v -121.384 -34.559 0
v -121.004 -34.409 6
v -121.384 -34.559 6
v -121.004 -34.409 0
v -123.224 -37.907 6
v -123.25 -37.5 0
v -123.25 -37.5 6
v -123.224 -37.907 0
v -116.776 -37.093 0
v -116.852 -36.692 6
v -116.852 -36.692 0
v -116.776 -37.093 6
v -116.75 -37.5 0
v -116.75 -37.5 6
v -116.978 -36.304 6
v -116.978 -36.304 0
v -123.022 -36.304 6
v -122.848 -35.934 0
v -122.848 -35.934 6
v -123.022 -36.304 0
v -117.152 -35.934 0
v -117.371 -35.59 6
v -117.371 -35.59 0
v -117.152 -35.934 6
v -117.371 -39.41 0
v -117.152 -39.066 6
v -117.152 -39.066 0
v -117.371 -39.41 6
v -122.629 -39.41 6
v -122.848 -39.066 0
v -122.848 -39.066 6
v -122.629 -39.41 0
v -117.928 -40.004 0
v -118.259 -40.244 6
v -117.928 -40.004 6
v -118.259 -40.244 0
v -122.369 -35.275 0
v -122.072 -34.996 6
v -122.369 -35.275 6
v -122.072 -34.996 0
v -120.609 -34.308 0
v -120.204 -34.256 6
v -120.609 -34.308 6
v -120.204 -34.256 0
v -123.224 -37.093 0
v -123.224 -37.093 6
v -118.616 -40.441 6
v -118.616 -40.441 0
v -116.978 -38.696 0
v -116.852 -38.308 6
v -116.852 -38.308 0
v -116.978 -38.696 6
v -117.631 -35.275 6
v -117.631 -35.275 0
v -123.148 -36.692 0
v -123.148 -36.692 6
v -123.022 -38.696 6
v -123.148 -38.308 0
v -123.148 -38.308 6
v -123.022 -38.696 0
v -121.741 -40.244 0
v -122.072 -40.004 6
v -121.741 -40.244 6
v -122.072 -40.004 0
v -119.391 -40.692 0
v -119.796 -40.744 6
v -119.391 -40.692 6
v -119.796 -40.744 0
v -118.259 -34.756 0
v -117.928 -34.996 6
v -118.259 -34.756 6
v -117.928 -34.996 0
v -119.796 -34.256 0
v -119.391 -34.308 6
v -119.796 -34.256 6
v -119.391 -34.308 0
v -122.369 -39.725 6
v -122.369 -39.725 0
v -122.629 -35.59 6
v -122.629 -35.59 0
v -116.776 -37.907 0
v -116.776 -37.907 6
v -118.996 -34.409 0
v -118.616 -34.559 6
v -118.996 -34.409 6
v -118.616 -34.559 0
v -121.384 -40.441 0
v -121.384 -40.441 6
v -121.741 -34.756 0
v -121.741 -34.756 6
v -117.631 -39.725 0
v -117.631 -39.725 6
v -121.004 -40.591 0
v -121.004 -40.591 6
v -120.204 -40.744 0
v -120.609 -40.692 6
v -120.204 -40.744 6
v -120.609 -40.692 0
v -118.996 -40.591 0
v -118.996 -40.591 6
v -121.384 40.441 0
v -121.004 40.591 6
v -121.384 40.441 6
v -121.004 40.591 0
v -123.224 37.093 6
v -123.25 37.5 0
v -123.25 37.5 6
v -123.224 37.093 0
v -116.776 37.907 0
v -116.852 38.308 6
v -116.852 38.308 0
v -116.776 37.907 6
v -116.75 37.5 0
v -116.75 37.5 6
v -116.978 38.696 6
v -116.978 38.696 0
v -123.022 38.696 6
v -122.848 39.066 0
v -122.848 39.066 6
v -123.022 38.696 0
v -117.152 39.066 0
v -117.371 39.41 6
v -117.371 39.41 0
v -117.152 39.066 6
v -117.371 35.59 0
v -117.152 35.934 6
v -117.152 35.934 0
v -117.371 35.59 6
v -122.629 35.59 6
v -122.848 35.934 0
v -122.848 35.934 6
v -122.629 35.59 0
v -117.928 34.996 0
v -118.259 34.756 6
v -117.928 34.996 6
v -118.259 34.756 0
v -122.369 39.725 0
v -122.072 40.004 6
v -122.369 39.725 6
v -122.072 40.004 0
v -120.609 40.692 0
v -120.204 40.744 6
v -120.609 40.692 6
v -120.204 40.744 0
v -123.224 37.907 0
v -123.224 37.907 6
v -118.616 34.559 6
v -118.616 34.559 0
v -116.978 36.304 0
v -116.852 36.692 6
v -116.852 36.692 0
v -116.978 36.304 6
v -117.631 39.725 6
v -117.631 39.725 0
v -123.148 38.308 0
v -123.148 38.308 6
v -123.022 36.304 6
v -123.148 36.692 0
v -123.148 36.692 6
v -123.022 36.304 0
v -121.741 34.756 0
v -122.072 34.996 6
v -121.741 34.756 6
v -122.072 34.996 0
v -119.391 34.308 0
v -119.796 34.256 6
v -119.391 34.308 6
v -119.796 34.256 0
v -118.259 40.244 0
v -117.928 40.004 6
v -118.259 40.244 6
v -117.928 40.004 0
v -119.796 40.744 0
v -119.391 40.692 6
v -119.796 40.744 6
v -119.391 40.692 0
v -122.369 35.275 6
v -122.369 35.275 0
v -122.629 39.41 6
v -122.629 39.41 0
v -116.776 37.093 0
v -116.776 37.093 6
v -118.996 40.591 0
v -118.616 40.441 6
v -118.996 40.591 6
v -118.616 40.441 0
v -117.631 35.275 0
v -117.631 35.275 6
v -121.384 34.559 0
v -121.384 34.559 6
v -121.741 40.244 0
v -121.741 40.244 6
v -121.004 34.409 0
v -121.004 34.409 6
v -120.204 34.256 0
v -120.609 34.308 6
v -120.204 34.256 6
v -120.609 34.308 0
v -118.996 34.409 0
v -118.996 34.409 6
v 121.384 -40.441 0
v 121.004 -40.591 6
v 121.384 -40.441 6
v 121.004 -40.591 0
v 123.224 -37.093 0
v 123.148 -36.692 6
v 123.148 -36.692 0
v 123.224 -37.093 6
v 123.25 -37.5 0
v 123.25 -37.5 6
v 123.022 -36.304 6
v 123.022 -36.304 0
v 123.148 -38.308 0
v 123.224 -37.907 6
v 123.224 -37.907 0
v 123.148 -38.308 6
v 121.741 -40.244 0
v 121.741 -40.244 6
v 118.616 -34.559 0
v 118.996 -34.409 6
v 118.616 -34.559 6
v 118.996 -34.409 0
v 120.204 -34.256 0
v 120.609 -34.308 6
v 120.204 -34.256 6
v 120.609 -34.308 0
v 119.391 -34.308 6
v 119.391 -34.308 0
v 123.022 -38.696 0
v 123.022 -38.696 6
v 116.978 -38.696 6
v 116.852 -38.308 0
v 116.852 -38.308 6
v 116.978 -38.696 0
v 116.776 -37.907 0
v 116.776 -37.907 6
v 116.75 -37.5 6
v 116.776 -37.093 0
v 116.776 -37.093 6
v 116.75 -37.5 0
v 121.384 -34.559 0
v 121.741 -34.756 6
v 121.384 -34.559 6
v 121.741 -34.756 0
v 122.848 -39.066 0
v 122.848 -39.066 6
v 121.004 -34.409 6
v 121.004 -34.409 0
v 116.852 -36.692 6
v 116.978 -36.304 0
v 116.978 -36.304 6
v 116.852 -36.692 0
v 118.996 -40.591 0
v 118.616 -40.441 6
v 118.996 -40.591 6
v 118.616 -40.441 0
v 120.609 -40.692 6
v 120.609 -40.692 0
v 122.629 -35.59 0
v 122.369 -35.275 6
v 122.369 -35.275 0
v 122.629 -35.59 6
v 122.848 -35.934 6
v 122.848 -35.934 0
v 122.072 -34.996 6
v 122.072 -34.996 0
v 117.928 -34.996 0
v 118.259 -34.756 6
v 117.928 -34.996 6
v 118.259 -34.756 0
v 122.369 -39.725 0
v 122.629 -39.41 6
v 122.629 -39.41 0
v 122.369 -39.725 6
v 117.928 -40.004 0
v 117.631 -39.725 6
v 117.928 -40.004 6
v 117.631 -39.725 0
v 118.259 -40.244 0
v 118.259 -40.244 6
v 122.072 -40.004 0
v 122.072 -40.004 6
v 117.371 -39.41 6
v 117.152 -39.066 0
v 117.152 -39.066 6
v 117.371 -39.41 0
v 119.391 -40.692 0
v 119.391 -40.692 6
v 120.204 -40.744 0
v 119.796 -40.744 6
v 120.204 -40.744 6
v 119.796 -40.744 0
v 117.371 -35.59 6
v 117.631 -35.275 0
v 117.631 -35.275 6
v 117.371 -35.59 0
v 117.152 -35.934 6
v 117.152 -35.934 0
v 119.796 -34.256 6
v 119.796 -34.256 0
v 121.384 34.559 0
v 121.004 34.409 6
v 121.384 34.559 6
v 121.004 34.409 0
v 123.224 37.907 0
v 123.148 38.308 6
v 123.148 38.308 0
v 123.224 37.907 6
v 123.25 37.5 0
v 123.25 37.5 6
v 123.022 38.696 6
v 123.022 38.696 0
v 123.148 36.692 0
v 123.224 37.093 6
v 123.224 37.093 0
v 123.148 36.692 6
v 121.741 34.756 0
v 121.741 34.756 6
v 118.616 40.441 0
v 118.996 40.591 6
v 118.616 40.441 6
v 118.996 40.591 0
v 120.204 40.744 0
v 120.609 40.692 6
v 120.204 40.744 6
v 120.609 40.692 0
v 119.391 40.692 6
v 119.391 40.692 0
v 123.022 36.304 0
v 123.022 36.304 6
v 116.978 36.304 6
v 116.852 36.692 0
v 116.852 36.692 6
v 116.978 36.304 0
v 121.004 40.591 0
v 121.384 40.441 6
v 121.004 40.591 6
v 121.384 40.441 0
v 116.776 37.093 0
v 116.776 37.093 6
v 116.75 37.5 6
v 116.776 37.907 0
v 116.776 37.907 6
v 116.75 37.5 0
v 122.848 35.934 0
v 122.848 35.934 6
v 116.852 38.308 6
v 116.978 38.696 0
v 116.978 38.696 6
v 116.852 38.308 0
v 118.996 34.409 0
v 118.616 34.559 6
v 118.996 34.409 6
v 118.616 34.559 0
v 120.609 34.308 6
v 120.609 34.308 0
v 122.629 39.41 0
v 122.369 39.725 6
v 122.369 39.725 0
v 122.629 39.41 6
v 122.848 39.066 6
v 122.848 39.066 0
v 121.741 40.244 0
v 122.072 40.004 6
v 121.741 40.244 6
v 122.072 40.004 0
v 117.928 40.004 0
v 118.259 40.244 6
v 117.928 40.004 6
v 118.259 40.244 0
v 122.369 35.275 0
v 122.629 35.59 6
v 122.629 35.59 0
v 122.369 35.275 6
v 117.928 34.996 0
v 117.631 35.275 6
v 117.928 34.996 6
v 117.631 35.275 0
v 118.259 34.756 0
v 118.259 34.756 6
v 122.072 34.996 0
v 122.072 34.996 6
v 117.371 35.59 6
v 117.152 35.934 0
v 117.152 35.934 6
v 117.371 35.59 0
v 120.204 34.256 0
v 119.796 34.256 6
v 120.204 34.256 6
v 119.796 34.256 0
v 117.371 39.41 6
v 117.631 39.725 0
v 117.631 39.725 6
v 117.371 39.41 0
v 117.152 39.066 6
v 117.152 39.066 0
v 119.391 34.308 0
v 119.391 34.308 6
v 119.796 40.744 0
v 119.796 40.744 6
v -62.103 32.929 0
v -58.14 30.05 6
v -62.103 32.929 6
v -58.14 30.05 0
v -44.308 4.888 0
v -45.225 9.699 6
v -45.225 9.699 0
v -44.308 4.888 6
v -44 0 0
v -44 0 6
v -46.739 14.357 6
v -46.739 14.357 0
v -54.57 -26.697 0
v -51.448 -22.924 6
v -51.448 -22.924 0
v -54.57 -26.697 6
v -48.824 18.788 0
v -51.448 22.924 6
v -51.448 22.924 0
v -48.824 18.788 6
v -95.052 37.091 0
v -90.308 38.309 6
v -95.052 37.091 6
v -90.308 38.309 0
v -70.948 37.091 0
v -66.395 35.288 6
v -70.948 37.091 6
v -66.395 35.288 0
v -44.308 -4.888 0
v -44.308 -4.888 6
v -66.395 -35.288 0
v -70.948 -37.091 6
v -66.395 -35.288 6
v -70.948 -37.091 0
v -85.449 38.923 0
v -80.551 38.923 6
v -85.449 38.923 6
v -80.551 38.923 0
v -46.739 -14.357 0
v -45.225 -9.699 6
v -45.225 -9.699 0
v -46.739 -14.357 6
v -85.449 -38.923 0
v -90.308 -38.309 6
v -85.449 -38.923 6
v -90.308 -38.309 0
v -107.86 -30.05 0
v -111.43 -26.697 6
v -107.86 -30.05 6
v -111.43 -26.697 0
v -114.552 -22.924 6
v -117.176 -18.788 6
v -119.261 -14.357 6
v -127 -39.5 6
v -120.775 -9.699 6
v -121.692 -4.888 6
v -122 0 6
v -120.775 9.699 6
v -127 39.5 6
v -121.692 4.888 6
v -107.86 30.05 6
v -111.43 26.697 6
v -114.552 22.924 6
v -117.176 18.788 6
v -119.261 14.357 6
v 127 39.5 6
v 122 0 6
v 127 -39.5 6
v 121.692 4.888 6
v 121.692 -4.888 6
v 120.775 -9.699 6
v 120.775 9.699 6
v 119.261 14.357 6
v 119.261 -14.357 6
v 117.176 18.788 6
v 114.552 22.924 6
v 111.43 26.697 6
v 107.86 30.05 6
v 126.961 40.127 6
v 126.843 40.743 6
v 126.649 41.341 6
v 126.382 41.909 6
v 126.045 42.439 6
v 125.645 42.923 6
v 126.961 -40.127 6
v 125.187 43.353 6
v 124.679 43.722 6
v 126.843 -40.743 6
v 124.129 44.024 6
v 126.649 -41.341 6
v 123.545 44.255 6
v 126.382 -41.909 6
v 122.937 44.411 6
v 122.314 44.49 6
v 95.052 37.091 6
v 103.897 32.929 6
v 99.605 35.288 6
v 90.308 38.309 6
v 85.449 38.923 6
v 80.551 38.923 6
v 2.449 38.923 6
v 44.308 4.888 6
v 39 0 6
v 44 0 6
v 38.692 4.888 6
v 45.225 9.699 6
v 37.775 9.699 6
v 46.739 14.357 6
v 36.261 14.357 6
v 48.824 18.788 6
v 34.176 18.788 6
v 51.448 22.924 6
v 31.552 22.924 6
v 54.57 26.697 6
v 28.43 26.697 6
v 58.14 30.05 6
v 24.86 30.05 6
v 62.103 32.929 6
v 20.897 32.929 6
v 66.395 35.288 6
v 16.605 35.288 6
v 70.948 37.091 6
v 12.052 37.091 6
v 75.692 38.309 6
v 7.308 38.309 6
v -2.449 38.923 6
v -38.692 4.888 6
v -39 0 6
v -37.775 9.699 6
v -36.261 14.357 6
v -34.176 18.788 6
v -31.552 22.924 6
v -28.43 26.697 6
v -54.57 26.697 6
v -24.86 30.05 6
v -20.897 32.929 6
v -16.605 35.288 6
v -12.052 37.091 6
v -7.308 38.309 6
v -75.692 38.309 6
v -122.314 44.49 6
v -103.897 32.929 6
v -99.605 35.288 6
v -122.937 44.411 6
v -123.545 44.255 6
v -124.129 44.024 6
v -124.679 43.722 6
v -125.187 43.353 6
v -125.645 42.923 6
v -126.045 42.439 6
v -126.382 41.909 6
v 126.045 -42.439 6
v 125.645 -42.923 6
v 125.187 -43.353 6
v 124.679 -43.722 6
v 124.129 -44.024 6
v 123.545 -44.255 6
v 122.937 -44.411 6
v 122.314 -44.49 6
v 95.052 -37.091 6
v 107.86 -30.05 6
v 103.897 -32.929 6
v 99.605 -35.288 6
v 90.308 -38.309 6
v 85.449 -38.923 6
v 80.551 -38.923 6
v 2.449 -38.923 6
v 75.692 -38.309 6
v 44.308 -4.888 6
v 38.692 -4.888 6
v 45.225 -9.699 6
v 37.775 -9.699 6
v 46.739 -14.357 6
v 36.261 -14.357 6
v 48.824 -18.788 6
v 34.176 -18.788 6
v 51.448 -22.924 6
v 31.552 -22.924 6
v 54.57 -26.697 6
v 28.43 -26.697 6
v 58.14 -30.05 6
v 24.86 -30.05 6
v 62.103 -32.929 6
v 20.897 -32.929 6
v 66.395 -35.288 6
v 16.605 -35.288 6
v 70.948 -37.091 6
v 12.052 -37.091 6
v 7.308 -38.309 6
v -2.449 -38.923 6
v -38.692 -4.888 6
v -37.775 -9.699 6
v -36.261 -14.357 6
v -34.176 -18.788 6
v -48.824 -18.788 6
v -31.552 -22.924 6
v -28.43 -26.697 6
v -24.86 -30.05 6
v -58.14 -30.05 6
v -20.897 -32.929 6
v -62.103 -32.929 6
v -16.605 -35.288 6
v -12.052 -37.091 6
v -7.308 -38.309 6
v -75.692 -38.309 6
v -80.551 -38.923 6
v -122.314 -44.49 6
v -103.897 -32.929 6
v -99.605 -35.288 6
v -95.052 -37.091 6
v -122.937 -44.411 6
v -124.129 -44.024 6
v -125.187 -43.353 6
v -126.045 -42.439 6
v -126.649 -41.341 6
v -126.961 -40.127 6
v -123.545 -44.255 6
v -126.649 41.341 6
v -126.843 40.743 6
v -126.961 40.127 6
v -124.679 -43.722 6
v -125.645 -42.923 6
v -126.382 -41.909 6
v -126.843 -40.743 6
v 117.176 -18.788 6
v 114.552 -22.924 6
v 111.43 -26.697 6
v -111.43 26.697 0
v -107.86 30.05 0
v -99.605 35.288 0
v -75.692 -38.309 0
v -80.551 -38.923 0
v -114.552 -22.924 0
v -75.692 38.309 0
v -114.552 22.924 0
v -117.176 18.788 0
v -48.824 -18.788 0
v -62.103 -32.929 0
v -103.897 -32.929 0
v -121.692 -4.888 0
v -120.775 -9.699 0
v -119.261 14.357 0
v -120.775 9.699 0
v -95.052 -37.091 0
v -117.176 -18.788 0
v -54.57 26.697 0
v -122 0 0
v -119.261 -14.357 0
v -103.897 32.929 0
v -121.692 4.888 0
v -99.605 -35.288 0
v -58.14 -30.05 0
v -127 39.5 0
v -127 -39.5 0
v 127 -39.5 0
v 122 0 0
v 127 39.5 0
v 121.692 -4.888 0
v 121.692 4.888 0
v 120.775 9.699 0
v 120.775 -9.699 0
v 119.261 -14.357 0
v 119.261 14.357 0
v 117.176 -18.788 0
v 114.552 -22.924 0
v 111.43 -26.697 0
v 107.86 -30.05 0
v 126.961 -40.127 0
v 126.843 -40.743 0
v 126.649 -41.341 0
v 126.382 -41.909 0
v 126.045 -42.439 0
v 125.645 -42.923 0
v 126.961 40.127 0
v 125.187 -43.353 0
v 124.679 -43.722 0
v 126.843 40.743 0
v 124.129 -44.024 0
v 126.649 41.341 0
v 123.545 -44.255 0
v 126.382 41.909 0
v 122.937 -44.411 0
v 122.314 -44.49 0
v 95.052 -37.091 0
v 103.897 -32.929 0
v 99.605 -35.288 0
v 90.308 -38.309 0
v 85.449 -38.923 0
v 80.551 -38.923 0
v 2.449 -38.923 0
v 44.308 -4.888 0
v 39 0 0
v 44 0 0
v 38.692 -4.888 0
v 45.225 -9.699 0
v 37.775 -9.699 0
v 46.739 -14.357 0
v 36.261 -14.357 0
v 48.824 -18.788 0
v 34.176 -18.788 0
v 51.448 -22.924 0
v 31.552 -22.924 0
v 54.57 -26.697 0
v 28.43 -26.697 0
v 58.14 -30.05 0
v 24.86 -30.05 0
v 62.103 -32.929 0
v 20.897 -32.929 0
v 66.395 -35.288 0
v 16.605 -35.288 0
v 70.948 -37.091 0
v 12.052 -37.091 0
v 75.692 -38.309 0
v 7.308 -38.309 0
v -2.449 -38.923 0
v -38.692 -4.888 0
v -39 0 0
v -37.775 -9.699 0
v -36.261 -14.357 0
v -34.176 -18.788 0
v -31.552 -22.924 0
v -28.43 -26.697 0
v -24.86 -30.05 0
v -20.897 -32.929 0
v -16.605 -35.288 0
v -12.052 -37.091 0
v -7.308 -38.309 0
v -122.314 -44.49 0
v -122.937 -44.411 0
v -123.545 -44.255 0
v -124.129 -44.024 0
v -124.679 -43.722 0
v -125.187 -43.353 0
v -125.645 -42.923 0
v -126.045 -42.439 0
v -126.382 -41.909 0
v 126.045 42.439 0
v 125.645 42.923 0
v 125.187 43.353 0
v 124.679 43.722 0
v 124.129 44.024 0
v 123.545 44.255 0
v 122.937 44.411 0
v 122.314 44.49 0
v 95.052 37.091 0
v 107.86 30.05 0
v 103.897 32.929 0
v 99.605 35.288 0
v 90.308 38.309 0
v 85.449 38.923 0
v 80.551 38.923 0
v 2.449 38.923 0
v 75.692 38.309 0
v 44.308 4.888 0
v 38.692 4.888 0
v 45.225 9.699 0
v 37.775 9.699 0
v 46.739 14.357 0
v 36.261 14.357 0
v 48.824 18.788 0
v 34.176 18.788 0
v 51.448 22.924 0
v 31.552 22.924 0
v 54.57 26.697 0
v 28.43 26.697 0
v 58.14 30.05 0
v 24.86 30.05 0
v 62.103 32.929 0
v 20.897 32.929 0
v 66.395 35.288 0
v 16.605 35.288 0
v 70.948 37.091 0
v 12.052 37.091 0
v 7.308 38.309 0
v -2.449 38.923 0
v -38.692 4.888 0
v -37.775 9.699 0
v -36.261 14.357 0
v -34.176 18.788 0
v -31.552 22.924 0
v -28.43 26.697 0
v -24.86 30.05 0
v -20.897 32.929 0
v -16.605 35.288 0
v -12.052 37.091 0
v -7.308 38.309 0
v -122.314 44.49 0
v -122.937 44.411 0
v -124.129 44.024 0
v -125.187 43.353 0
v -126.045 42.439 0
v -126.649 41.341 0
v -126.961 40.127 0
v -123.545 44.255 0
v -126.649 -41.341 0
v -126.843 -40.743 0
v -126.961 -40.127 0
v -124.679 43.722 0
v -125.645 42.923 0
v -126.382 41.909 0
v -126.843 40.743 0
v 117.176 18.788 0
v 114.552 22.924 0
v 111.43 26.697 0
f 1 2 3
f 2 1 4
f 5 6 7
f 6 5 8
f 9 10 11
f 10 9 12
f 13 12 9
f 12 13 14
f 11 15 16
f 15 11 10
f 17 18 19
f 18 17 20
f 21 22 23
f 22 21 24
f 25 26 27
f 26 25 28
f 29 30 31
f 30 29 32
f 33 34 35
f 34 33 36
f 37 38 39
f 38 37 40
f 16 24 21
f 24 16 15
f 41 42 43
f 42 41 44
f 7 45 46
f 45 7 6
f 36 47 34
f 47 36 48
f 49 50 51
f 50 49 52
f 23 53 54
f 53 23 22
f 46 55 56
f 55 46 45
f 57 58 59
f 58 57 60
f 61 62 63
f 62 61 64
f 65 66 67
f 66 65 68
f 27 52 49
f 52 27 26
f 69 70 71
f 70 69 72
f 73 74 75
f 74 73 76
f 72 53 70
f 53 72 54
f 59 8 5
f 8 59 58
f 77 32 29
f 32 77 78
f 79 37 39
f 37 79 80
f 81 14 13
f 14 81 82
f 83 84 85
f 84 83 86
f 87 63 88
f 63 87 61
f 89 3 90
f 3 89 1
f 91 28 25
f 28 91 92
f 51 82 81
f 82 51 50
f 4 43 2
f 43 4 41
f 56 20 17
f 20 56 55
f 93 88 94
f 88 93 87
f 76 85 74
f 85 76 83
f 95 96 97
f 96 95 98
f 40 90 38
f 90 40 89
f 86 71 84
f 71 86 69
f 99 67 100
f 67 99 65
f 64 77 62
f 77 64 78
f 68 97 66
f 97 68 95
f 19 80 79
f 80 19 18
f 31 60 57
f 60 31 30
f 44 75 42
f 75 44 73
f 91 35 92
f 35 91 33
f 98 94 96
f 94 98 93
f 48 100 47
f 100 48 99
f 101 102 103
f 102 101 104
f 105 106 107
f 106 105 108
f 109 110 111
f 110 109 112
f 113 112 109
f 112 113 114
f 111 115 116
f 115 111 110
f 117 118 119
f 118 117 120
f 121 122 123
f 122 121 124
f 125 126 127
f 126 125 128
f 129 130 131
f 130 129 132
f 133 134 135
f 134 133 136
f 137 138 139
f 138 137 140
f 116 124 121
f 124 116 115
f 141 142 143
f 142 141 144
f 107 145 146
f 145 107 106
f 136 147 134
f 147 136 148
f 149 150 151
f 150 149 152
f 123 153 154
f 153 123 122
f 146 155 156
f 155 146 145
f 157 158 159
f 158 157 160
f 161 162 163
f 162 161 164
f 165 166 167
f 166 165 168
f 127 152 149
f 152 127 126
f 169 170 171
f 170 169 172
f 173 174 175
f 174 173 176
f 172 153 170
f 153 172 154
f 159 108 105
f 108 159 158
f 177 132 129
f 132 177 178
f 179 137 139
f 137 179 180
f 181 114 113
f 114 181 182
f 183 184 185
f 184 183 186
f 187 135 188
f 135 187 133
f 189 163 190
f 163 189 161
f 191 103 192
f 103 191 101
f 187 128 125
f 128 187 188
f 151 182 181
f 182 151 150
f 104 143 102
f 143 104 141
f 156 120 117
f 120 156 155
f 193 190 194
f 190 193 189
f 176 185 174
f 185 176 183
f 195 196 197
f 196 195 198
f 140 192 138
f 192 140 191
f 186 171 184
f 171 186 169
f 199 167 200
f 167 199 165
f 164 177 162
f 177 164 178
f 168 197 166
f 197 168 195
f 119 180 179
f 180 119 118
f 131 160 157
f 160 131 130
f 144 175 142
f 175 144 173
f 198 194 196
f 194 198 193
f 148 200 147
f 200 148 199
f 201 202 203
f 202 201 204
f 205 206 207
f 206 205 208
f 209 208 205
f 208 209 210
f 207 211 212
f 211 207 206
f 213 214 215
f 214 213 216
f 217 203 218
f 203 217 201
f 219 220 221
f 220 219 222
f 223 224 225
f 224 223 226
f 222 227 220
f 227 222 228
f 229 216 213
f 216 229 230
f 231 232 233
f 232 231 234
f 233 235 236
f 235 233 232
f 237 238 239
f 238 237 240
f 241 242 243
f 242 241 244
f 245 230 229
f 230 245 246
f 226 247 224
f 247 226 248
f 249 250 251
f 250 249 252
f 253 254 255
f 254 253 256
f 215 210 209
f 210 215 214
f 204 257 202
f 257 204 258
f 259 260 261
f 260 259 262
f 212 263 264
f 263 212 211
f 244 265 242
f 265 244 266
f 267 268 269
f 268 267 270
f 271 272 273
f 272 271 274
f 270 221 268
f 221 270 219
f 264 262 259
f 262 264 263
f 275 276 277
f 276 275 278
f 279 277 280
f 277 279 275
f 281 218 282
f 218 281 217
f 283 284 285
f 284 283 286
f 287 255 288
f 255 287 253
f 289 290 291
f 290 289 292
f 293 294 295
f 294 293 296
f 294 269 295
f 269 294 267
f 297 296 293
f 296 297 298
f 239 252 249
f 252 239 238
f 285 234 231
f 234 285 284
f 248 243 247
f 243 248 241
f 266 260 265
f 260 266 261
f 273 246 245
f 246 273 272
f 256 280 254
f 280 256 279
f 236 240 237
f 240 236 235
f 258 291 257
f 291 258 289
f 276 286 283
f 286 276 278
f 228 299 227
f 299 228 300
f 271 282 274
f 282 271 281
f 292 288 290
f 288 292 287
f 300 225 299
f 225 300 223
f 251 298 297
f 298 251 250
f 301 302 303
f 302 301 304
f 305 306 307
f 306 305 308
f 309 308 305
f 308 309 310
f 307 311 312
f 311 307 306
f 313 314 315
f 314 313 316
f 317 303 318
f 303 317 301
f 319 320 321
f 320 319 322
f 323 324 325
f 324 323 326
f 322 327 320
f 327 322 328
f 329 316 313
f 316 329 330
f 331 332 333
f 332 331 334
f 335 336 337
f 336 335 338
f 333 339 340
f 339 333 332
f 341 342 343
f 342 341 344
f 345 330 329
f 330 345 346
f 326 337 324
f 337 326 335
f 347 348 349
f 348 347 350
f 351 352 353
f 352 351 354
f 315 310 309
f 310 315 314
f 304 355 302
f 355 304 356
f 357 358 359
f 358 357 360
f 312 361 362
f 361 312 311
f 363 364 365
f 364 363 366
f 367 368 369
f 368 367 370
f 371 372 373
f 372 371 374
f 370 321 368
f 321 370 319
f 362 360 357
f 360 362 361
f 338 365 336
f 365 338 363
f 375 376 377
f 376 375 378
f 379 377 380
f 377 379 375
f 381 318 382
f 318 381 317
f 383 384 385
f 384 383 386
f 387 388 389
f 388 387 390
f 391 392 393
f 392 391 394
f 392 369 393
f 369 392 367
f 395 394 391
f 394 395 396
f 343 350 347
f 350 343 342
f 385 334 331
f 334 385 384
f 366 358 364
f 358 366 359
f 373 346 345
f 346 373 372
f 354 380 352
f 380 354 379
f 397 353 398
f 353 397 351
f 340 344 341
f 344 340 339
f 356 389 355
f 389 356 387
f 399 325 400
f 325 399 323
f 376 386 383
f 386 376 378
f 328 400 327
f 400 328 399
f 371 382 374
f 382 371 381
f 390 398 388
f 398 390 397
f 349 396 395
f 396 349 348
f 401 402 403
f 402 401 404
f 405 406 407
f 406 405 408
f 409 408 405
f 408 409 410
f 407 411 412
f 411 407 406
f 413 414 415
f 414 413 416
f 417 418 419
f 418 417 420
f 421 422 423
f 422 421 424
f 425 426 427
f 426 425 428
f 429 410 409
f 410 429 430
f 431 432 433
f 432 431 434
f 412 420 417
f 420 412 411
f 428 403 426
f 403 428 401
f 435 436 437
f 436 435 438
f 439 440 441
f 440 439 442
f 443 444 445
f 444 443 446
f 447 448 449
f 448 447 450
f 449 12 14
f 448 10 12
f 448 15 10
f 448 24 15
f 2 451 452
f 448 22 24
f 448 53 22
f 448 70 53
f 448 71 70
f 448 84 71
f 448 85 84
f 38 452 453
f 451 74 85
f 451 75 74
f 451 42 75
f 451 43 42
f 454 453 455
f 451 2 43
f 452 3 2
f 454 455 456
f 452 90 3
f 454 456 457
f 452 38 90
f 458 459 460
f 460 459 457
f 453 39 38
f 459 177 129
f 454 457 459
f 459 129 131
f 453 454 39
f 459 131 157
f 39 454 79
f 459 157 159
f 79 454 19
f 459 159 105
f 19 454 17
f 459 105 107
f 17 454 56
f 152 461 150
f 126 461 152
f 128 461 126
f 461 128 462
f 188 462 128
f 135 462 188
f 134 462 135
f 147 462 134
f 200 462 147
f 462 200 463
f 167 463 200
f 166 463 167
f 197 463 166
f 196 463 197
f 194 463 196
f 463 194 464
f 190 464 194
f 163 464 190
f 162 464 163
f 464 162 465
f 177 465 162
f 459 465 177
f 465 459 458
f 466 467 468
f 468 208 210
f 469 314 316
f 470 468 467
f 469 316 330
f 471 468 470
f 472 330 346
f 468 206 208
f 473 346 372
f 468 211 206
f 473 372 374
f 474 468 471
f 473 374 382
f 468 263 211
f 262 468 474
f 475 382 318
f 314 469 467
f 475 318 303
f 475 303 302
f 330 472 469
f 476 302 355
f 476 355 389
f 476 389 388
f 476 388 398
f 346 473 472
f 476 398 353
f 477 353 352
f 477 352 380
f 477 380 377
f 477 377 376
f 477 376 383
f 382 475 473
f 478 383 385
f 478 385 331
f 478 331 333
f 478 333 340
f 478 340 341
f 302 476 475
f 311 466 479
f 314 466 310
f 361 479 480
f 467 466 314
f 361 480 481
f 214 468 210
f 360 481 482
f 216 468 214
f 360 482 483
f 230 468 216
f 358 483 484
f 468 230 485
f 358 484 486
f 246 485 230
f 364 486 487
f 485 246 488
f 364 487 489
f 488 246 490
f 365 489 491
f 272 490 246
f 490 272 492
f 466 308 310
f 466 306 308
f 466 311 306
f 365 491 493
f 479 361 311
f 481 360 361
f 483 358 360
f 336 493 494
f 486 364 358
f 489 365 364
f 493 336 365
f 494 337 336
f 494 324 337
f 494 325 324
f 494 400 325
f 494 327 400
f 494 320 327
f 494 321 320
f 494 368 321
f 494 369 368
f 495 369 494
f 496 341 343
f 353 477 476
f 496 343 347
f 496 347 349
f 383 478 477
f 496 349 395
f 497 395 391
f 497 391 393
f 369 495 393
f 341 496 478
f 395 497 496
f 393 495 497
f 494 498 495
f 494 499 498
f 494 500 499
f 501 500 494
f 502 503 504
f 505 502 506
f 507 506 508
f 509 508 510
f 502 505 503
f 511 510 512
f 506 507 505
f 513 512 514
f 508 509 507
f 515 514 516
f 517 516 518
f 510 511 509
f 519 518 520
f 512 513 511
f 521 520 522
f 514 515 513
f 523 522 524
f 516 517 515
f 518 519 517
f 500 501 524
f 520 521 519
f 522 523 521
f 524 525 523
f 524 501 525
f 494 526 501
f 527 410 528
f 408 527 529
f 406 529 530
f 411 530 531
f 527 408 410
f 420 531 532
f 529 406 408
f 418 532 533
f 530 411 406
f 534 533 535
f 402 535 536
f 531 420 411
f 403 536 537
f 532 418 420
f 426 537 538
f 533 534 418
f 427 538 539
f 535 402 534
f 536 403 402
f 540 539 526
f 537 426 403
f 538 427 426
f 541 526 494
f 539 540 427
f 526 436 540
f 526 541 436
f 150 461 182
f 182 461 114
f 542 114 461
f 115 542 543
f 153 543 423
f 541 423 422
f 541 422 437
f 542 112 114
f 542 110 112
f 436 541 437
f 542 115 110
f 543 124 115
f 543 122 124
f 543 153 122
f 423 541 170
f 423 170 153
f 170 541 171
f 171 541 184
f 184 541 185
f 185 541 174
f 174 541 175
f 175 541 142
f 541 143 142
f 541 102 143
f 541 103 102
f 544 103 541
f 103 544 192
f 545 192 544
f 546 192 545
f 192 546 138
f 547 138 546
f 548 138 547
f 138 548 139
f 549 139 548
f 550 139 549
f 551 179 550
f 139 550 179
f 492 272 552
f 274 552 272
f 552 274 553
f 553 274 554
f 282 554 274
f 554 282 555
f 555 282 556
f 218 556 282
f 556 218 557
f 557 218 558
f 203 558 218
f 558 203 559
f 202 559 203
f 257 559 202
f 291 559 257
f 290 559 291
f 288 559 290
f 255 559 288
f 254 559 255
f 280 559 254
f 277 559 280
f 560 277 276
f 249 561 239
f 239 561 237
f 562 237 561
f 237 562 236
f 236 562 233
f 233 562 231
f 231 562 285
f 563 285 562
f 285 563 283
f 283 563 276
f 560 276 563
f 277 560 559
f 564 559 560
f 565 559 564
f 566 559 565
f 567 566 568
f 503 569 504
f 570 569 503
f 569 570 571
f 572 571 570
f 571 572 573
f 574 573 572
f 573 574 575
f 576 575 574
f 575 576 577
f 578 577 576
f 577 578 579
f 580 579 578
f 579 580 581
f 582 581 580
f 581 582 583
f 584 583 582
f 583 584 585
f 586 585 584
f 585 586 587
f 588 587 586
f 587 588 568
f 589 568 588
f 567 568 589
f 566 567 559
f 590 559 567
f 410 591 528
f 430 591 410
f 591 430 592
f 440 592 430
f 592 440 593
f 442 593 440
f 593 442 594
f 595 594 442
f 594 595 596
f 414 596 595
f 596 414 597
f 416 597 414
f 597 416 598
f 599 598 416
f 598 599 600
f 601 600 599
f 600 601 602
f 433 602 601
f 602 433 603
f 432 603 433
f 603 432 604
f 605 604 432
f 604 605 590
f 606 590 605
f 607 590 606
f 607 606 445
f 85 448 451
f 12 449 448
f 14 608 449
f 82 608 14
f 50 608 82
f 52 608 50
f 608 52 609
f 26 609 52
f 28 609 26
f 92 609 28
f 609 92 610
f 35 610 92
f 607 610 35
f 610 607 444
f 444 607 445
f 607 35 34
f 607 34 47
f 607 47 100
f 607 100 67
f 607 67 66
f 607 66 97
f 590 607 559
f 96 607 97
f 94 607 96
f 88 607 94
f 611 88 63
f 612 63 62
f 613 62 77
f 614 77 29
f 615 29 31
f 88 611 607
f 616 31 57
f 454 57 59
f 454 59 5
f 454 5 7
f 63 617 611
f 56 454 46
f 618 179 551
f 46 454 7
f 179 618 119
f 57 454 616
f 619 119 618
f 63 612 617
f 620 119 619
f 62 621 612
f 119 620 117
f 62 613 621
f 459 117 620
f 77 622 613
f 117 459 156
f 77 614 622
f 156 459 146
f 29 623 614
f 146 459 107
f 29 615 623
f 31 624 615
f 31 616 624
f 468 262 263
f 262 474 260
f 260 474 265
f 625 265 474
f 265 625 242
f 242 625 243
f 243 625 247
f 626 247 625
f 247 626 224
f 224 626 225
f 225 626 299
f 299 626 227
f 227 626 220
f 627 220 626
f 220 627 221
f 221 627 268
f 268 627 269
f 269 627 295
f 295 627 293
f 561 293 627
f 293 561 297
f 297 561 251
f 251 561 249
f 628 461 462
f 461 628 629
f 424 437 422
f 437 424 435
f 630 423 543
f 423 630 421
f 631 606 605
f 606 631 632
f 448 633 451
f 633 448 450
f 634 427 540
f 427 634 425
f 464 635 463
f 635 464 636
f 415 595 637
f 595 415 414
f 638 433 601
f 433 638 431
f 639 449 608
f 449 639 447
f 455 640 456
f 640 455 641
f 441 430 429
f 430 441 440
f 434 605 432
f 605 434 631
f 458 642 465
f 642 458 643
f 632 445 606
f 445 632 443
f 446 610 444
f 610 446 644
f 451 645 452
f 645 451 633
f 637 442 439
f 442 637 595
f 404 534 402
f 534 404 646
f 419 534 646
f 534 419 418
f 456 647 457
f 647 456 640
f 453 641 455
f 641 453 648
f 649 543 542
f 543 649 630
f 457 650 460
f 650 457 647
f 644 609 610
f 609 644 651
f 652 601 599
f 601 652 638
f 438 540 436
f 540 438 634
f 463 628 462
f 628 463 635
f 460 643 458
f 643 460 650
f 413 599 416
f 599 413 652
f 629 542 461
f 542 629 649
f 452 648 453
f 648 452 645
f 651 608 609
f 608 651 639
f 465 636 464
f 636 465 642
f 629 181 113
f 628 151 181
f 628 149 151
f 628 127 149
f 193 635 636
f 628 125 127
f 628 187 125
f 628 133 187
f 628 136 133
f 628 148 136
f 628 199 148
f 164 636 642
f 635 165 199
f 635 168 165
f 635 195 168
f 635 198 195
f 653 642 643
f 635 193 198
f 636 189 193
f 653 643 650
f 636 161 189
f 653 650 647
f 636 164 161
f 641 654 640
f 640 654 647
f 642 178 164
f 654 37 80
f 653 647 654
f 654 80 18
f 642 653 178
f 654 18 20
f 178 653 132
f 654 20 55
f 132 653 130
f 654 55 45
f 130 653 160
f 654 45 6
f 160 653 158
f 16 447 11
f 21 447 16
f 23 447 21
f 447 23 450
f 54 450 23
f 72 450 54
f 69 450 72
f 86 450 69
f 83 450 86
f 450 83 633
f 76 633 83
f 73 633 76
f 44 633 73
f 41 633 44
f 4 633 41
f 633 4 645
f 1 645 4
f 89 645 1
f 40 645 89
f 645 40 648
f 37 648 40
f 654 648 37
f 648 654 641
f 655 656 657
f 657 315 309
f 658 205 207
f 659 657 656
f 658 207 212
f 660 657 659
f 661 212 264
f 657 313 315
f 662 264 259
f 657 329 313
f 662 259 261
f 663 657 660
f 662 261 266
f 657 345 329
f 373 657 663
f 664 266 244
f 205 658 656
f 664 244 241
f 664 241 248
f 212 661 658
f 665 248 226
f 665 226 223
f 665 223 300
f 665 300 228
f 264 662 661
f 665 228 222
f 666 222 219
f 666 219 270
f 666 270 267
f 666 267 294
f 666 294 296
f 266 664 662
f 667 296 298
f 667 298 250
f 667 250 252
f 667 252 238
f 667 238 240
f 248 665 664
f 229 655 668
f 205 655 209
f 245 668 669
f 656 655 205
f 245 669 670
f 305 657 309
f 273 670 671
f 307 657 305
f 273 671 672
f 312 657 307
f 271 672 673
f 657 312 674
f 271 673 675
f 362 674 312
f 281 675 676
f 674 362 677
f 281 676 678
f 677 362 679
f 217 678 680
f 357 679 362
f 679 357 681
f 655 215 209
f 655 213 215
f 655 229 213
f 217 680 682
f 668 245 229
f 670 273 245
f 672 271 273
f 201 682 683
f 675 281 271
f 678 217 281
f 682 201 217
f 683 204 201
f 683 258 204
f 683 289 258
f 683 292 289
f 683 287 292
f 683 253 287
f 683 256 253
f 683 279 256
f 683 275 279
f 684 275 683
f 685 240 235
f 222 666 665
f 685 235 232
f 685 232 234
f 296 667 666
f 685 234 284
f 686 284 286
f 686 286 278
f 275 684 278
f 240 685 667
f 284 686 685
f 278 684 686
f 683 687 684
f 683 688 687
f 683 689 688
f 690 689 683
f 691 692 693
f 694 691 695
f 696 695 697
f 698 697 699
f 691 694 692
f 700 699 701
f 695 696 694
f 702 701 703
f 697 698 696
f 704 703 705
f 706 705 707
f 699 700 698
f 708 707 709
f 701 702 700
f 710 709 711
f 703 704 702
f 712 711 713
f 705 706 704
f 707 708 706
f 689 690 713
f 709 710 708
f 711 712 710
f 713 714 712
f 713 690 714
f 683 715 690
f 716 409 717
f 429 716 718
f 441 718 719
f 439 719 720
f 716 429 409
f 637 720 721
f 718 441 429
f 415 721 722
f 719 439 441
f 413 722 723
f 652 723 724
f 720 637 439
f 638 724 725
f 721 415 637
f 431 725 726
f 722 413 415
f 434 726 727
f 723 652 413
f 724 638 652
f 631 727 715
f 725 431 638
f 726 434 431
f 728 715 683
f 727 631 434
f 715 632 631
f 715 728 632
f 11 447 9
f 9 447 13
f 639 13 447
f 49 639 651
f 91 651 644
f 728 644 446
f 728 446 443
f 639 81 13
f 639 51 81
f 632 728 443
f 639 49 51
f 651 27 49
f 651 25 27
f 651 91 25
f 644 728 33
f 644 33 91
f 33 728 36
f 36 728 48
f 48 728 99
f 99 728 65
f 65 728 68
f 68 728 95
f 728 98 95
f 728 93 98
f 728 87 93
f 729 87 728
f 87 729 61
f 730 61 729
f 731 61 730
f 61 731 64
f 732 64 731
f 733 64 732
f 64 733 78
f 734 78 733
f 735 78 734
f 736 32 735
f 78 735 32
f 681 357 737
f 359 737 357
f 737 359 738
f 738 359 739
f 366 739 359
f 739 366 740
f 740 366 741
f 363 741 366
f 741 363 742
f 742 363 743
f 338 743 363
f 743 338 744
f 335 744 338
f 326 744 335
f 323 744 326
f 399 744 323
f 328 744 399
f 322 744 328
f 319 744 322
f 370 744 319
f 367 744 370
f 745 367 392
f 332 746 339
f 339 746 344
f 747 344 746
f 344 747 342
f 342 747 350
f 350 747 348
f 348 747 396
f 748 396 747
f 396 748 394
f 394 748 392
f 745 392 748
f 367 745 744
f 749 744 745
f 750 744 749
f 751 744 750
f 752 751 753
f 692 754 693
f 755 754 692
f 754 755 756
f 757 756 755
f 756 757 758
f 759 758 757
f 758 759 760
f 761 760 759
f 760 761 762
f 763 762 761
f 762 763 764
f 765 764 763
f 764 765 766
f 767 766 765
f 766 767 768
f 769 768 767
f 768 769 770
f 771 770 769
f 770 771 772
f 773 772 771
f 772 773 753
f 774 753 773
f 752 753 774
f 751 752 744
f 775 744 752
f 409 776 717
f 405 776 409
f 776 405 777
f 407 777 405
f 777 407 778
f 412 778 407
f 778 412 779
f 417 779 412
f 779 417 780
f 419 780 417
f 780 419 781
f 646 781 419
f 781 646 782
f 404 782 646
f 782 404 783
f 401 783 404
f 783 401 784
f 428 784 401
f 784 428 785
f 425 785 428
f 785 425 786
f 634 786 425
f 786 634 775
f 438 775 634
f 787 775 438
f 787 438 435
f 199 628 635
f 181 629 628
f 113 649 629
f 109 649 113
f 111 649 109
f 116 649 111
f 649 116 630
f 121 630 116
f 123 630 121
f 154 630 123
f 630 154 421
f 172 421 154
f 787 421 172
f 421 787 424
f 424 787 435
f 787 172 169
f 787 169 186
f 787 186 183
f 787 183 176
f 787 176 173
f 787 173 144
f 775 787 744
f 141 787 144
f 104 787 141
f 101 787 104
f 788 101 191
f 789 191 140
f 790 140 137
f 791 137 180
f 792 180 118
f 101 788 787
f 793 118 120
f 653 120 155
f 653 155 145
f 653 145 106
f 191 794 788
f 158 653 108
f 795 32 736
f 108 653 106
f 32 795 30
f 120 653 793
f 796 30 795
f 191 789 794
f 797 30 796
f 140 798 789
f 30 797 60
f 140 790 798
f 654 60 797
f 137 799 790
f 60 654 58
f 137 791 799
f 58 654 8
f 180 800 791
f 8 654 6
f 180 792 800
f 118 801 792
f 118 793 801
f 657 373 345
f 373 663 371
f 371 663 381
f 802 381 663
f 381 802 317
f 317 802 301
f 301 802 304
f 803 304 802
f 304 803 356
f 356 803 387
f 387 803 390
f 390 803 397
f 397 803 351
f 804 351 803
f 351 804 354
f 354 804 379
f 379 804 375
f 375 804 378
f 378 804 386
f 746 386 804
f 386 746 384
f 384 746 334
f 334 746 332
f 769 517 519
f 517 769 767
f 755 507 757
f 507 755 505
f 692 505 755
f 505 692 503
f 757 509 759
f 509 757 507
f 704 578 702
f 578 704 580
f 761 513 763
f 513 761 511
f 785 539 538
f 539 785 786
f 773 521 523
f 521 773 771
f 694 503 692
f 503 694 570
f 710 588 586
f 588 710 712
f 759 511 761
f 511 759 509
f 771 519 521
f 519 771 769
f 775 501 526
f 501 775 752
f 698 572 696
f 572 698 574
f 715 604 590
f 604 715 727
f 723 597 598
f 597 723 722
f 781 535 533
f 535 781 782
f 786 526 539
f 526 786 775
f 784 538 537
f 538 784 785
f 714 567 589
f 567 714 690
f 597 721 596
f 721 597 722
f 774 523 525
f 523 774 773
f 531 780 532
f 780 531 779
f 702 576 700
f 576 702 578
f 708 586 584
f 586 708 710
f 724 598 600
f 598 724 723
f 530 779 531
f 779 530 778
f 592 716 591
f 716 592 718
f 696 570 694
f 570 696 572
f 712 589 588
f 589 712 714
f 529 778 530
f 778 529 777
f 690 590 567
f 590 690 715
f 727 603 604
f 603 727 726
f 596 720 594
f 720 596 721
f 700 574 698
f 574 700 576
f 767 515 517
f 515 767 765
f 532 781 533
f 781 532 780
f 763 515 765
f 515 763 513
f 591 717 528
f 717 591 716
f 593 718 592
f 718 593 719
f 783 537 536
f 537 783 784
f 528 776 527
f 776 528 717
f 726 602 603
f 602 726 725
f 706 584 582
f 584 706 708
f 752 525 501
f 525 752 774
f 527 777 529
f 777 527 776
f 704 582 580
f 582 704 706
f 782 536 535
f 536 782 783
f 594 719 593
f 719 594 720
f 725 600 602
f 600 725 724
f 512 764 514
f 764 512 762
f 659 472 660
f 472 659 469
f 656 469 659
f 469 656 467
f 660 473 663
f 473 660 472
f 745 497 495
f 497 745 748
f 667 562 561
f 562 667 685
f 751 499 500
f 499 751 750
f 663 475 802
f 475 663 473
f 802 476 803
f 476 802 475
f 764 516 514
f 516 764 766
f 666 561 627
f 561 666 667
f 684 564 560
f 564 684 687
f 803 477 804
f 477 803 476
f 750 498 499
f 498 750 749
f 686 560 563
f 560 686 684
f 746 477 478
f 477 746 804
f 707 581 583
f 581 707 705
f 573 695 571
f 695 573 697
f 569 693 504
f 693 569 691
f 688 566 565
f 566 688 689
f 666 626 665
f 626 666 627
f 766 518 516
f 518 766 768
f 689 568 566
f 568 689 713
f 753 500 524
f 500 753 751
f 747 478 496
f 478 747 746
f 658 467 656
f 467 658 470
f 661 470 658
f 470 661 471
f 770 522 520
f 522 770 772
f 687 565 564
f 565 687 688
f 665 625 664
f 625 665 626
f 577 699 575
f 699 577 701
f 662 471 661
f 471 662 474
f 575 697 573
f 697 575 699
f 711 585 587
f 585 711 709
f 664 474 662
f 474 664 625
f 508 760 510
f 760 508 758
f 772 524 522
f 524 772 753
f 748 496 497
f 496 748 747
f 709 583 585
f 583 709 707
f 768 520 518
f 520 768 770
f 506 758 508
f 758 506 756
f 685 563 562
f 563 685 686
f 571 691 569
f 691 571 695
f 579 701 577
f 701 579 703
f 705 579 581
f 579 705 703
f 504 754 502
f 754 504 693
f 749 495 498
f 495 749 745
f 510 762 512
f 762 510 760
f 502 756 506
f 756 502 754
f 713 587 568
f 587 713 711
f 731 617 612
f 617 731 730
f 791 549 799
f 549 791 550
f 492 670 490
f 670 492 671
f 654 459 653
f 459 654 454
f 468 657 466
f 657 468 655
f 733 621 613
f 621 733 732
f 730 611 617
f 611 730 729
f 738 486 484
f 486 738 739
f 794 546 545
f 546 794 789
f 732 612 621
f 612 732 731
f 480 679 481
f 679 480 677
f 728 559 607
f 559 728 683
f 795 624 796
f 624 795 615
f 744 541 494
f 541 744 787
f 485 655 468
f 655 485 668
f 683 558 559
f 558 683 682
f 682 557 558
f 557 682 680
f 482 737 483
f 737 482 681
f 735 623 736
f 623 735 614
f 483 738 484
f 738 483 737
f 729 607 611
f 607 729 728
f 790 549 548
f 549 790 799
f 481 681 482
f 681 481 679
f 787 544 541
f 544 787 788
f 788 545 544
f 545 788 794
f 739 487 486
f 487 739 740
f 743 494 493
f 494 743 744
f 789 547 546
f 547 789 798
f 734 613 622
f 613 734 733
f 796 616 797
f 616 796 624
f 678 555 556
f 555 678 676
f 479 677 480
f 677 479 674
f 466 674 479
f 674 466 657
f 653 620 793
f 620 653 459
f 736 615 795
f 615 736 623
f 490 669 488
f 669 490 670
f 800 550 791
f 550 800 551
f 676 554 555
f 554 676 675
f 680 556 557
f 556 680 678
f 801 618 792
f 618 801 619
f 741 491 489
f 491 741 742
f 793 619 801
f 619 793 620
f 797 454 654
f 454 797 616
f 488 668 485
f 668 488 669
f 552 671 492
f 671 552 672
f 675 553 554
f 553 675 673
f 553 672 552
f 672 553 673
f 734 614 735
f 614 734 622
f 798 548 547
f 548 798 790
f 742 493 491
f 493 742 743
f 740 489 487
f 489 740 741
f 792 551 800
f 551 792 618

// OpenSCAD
$fn = 50;

difference() {
	union() {
		hull() {
			translate(v = [-122.0, 39.5, 0]) {
				cylinder(h = 6, r = 5);
			}
			translate(v = [122.0, 39.5, 0]) {
				cylinder(h = 6, r = 5);
			}
			translate(v = [-122.0, -39.5, 0]) {
				cylinder(h = 6, r = 5);
			}
			translate(v = [122.0, -39.5, 0]) {
				cylinder(h = 6, r = 5);
			}
		}
	}
	union() {
		translate(v = [-120.0, -37.5, -100.0]) {
			cylinder(h = 200, r = 3.25);
		}
		translate(v = [-120.0, 37.5, -100.0]) {
			cylinder(h = 200, r = 3.25);
		}
		translate(v = [120.0, -37.5, -100.0]) {
			cylinder(h = 200, r = 3.25);
		}
		translate(v = [120.0, 37.5, -100.0]) {
			cylinder(h = 200, r = 3.25);
		}
		translate(v = [-120.0, -37.5, -100.0]) {
			cylinder(h = 200, r = 1.8);
		}
		translate(v = [-120.0, 37.5, -100.0]) {
			cylinder(h = 200, r = 1.8);
		}
		translate(v = [120.0, -37.5, -100.0]) {
			cylinder(h = 200, r = 1.8);
		}
		translate(v = [120.0, 37.5, -100.0]) {
			cylinder(h = 200, r = 1.8);
		}
		translate(v = [-83.0, 0, 0.0]) {
			cylinder(h = 6, r = 39.0);
		}
		cylinder(h = 6, r = 39.0);
		translate(v = [83.0, 0, 0.0]) {
			cylinder(h = 6, r = 39.0);
		}
	}
}
